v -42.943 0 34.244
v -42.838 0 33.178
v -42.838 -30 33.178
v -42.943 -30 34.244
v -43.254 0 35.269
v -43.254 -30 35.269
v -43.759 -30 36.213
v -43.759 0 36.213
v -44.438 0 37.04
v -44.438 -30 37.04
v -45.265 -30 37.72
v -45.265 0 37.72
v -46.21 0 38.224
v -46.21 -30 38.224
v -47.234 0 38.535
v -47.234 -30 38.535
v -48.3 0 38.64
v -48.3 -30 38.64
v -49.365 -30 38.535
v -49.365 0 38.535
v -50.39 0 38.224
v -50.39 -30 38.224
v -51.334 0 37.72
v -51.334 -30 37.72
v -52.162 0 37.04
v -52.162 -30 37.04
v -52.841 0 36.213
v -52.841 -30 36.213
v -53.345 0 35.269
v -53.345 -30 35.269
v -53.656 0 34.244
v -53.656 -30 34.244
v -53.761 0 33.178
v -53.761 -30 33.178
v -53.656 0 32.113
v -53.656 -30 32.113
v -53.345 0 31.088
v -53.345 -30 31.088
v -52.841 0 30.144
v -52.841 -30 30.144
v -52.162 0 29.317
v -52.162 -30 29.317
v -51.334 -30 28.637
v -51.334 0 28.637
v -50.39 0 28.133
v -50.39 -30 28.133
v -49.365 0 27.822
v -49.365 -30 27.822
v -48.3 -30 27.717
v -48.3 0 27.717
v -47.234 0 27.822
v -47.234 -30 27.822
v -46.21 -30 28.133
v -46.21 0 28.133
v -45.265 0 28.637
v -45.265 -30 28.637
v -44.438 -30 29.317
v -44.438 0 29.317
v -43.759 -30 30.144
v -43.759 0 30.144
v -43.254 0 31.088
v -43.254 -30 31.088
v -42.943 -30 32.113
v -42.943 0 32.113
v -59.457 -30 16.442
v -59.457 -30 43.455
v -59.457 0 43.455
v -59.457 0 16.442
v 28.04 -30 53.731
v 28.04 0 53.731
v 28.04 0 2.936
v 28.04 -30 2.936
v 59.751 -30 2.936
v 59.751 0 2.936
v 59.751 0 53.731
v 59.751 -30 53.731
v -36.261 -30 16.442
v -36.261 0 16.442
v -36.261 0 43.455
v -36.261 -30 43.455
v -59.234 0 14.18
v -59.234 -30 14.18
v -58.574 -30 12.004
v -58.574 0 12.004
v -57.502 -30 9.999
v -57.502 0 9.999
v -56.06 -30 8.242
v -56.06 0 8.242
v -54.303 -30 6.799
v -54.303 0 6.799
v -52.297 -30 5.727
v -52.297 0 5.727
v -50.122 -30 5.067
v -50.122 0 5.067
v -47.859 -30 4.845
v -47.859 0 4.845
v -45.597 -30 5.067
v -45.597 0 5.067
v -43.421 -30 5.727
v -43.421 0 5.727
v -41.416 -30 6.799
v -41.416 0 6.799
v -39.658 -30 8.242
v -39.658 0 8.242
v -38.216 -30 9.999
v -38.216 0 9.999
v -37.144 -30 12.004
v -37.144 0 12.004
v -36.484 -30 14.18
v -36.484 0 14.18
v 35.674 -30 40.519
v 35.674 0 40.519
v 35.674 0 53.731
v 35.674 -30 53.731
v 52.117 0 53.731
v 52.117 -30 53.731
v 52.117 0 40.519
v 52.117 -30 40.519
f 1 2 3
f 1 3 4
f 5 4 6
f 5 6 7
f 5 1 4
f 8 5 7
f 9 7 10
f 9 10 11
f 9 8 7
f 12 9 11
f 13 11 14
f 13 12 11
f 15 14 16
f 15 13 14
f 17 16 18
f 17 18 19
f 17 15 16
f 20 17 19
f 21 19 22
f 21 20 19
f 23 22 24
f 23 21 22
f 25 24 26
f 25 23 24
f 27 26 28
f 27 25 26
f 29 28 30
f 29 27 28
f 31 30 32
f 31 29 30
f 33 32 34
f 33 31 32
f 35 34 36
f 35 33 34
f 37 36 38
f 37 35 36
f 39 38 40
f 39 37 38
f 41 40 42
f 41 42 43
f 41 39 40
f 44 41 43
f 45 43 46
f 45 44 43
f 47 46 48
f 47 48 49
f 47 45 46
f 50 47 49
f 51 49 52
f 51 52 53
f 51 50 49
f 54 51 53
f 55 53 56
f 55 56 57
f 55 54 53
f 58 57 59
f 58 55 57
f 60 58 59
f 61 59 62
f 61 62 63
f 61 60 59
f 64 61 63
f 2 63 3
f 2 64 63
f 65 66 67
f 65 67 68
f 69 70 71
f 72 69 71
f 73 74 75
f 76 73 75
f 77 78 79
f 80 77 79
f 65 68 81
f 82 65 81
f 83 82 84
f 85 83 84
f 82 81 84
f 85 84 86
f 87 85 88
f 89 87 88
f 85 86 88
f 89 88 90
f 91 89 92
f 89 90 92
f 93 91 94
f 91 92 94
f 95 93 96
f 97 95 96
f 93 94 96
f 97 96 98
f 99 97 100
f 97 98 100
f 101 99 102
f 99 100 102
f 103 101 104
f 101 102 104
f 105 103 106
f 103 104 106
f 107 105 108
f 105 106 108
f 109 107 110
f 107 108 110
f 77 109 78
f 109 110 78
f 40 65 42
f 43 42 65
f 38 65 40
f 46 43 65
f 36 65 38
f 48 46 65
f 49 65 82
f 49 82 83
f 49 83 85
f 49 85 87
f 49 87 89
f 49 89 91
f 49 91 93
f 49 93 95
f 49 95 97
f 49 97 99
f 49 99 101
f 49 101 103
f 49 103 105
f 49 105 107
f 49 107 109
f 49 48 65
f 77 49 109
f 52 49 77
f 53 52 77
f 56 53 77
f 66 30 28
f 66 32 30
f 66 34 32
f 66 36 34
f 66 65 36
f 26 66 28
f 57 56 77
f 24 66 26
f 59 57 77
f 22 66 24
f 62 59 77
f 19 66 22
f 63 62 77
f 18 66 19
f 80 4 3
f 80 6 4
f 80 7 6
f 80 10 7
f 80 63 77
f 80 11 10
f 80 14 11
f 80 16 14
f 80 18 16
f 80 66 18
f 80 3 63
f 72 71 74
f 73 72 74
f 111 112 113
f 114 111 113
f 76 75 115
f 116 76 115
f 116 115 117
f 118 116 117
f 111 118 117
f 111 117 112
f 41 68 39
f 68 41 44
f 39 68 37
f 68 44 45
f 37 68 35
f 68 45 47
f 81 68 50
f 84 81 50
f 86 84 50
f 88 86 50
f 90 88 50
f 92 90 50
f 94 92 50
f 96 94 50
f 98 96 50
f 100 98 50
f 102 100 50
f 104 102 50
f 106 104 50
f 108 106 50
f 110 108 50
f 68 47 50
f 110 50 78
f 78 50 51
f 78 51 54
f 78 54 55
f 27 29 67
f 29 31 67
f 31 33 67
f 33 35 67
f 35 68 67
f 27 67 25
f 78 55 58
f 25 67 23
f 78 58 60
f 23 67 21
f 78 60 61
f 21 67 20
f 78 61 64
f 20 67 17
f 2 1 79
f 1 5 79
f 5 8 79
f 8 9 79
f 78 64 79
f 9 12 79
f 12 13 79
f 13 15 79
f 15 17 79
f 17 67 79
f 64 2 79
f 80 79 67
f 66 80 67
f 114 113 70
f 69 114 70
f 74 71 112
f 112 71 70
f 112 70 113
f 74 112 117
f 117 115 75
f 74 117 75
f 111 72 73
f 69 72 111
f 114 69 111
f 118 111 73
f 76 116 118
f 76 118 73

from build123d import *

# Parameters (mm, degrees)
F0_R     = 5.461548
F1_DEPTH = 30


with BuildPart() as f1:
    # F0 (on Front) → F1 (new body)
    with BuildSketch(Plane.XZ):
        with BuildLine():
            Line((-36.261413, 43.454971), (-59.456971, 43.454971))
            Line((-59.456971, 43.454971), (-59.456971, 16.442422))
            ThreePointArc((-59.456971, 16.442422), (-47.859192, 4.844643), (-36.261413, 16.442422))
            Line((-36.261413, 16.442422), (-36.261413, 43.454971))
        make_face()
        with Locations((-48.299614, 33.17846)):
            Circle(F0_R, mode=Mode.SUBTRACT)
        Polygon((28.0402, 32.884844), (28.0402, 2.936147), (59.75059, 2.936147), (59.75059, 32.884844), (59.75059, 40.518828), (59.75059, 53.731486), (52.116606, 53.731486), (52.116606, 40.518828), (35.674185, 40.518828), (35.674185, 53.731486), (28.0402, 53.731486), (28.0402, 40.518828), align=None)
    extrude(amount=F1_DEPTH)


solid = f1.part
